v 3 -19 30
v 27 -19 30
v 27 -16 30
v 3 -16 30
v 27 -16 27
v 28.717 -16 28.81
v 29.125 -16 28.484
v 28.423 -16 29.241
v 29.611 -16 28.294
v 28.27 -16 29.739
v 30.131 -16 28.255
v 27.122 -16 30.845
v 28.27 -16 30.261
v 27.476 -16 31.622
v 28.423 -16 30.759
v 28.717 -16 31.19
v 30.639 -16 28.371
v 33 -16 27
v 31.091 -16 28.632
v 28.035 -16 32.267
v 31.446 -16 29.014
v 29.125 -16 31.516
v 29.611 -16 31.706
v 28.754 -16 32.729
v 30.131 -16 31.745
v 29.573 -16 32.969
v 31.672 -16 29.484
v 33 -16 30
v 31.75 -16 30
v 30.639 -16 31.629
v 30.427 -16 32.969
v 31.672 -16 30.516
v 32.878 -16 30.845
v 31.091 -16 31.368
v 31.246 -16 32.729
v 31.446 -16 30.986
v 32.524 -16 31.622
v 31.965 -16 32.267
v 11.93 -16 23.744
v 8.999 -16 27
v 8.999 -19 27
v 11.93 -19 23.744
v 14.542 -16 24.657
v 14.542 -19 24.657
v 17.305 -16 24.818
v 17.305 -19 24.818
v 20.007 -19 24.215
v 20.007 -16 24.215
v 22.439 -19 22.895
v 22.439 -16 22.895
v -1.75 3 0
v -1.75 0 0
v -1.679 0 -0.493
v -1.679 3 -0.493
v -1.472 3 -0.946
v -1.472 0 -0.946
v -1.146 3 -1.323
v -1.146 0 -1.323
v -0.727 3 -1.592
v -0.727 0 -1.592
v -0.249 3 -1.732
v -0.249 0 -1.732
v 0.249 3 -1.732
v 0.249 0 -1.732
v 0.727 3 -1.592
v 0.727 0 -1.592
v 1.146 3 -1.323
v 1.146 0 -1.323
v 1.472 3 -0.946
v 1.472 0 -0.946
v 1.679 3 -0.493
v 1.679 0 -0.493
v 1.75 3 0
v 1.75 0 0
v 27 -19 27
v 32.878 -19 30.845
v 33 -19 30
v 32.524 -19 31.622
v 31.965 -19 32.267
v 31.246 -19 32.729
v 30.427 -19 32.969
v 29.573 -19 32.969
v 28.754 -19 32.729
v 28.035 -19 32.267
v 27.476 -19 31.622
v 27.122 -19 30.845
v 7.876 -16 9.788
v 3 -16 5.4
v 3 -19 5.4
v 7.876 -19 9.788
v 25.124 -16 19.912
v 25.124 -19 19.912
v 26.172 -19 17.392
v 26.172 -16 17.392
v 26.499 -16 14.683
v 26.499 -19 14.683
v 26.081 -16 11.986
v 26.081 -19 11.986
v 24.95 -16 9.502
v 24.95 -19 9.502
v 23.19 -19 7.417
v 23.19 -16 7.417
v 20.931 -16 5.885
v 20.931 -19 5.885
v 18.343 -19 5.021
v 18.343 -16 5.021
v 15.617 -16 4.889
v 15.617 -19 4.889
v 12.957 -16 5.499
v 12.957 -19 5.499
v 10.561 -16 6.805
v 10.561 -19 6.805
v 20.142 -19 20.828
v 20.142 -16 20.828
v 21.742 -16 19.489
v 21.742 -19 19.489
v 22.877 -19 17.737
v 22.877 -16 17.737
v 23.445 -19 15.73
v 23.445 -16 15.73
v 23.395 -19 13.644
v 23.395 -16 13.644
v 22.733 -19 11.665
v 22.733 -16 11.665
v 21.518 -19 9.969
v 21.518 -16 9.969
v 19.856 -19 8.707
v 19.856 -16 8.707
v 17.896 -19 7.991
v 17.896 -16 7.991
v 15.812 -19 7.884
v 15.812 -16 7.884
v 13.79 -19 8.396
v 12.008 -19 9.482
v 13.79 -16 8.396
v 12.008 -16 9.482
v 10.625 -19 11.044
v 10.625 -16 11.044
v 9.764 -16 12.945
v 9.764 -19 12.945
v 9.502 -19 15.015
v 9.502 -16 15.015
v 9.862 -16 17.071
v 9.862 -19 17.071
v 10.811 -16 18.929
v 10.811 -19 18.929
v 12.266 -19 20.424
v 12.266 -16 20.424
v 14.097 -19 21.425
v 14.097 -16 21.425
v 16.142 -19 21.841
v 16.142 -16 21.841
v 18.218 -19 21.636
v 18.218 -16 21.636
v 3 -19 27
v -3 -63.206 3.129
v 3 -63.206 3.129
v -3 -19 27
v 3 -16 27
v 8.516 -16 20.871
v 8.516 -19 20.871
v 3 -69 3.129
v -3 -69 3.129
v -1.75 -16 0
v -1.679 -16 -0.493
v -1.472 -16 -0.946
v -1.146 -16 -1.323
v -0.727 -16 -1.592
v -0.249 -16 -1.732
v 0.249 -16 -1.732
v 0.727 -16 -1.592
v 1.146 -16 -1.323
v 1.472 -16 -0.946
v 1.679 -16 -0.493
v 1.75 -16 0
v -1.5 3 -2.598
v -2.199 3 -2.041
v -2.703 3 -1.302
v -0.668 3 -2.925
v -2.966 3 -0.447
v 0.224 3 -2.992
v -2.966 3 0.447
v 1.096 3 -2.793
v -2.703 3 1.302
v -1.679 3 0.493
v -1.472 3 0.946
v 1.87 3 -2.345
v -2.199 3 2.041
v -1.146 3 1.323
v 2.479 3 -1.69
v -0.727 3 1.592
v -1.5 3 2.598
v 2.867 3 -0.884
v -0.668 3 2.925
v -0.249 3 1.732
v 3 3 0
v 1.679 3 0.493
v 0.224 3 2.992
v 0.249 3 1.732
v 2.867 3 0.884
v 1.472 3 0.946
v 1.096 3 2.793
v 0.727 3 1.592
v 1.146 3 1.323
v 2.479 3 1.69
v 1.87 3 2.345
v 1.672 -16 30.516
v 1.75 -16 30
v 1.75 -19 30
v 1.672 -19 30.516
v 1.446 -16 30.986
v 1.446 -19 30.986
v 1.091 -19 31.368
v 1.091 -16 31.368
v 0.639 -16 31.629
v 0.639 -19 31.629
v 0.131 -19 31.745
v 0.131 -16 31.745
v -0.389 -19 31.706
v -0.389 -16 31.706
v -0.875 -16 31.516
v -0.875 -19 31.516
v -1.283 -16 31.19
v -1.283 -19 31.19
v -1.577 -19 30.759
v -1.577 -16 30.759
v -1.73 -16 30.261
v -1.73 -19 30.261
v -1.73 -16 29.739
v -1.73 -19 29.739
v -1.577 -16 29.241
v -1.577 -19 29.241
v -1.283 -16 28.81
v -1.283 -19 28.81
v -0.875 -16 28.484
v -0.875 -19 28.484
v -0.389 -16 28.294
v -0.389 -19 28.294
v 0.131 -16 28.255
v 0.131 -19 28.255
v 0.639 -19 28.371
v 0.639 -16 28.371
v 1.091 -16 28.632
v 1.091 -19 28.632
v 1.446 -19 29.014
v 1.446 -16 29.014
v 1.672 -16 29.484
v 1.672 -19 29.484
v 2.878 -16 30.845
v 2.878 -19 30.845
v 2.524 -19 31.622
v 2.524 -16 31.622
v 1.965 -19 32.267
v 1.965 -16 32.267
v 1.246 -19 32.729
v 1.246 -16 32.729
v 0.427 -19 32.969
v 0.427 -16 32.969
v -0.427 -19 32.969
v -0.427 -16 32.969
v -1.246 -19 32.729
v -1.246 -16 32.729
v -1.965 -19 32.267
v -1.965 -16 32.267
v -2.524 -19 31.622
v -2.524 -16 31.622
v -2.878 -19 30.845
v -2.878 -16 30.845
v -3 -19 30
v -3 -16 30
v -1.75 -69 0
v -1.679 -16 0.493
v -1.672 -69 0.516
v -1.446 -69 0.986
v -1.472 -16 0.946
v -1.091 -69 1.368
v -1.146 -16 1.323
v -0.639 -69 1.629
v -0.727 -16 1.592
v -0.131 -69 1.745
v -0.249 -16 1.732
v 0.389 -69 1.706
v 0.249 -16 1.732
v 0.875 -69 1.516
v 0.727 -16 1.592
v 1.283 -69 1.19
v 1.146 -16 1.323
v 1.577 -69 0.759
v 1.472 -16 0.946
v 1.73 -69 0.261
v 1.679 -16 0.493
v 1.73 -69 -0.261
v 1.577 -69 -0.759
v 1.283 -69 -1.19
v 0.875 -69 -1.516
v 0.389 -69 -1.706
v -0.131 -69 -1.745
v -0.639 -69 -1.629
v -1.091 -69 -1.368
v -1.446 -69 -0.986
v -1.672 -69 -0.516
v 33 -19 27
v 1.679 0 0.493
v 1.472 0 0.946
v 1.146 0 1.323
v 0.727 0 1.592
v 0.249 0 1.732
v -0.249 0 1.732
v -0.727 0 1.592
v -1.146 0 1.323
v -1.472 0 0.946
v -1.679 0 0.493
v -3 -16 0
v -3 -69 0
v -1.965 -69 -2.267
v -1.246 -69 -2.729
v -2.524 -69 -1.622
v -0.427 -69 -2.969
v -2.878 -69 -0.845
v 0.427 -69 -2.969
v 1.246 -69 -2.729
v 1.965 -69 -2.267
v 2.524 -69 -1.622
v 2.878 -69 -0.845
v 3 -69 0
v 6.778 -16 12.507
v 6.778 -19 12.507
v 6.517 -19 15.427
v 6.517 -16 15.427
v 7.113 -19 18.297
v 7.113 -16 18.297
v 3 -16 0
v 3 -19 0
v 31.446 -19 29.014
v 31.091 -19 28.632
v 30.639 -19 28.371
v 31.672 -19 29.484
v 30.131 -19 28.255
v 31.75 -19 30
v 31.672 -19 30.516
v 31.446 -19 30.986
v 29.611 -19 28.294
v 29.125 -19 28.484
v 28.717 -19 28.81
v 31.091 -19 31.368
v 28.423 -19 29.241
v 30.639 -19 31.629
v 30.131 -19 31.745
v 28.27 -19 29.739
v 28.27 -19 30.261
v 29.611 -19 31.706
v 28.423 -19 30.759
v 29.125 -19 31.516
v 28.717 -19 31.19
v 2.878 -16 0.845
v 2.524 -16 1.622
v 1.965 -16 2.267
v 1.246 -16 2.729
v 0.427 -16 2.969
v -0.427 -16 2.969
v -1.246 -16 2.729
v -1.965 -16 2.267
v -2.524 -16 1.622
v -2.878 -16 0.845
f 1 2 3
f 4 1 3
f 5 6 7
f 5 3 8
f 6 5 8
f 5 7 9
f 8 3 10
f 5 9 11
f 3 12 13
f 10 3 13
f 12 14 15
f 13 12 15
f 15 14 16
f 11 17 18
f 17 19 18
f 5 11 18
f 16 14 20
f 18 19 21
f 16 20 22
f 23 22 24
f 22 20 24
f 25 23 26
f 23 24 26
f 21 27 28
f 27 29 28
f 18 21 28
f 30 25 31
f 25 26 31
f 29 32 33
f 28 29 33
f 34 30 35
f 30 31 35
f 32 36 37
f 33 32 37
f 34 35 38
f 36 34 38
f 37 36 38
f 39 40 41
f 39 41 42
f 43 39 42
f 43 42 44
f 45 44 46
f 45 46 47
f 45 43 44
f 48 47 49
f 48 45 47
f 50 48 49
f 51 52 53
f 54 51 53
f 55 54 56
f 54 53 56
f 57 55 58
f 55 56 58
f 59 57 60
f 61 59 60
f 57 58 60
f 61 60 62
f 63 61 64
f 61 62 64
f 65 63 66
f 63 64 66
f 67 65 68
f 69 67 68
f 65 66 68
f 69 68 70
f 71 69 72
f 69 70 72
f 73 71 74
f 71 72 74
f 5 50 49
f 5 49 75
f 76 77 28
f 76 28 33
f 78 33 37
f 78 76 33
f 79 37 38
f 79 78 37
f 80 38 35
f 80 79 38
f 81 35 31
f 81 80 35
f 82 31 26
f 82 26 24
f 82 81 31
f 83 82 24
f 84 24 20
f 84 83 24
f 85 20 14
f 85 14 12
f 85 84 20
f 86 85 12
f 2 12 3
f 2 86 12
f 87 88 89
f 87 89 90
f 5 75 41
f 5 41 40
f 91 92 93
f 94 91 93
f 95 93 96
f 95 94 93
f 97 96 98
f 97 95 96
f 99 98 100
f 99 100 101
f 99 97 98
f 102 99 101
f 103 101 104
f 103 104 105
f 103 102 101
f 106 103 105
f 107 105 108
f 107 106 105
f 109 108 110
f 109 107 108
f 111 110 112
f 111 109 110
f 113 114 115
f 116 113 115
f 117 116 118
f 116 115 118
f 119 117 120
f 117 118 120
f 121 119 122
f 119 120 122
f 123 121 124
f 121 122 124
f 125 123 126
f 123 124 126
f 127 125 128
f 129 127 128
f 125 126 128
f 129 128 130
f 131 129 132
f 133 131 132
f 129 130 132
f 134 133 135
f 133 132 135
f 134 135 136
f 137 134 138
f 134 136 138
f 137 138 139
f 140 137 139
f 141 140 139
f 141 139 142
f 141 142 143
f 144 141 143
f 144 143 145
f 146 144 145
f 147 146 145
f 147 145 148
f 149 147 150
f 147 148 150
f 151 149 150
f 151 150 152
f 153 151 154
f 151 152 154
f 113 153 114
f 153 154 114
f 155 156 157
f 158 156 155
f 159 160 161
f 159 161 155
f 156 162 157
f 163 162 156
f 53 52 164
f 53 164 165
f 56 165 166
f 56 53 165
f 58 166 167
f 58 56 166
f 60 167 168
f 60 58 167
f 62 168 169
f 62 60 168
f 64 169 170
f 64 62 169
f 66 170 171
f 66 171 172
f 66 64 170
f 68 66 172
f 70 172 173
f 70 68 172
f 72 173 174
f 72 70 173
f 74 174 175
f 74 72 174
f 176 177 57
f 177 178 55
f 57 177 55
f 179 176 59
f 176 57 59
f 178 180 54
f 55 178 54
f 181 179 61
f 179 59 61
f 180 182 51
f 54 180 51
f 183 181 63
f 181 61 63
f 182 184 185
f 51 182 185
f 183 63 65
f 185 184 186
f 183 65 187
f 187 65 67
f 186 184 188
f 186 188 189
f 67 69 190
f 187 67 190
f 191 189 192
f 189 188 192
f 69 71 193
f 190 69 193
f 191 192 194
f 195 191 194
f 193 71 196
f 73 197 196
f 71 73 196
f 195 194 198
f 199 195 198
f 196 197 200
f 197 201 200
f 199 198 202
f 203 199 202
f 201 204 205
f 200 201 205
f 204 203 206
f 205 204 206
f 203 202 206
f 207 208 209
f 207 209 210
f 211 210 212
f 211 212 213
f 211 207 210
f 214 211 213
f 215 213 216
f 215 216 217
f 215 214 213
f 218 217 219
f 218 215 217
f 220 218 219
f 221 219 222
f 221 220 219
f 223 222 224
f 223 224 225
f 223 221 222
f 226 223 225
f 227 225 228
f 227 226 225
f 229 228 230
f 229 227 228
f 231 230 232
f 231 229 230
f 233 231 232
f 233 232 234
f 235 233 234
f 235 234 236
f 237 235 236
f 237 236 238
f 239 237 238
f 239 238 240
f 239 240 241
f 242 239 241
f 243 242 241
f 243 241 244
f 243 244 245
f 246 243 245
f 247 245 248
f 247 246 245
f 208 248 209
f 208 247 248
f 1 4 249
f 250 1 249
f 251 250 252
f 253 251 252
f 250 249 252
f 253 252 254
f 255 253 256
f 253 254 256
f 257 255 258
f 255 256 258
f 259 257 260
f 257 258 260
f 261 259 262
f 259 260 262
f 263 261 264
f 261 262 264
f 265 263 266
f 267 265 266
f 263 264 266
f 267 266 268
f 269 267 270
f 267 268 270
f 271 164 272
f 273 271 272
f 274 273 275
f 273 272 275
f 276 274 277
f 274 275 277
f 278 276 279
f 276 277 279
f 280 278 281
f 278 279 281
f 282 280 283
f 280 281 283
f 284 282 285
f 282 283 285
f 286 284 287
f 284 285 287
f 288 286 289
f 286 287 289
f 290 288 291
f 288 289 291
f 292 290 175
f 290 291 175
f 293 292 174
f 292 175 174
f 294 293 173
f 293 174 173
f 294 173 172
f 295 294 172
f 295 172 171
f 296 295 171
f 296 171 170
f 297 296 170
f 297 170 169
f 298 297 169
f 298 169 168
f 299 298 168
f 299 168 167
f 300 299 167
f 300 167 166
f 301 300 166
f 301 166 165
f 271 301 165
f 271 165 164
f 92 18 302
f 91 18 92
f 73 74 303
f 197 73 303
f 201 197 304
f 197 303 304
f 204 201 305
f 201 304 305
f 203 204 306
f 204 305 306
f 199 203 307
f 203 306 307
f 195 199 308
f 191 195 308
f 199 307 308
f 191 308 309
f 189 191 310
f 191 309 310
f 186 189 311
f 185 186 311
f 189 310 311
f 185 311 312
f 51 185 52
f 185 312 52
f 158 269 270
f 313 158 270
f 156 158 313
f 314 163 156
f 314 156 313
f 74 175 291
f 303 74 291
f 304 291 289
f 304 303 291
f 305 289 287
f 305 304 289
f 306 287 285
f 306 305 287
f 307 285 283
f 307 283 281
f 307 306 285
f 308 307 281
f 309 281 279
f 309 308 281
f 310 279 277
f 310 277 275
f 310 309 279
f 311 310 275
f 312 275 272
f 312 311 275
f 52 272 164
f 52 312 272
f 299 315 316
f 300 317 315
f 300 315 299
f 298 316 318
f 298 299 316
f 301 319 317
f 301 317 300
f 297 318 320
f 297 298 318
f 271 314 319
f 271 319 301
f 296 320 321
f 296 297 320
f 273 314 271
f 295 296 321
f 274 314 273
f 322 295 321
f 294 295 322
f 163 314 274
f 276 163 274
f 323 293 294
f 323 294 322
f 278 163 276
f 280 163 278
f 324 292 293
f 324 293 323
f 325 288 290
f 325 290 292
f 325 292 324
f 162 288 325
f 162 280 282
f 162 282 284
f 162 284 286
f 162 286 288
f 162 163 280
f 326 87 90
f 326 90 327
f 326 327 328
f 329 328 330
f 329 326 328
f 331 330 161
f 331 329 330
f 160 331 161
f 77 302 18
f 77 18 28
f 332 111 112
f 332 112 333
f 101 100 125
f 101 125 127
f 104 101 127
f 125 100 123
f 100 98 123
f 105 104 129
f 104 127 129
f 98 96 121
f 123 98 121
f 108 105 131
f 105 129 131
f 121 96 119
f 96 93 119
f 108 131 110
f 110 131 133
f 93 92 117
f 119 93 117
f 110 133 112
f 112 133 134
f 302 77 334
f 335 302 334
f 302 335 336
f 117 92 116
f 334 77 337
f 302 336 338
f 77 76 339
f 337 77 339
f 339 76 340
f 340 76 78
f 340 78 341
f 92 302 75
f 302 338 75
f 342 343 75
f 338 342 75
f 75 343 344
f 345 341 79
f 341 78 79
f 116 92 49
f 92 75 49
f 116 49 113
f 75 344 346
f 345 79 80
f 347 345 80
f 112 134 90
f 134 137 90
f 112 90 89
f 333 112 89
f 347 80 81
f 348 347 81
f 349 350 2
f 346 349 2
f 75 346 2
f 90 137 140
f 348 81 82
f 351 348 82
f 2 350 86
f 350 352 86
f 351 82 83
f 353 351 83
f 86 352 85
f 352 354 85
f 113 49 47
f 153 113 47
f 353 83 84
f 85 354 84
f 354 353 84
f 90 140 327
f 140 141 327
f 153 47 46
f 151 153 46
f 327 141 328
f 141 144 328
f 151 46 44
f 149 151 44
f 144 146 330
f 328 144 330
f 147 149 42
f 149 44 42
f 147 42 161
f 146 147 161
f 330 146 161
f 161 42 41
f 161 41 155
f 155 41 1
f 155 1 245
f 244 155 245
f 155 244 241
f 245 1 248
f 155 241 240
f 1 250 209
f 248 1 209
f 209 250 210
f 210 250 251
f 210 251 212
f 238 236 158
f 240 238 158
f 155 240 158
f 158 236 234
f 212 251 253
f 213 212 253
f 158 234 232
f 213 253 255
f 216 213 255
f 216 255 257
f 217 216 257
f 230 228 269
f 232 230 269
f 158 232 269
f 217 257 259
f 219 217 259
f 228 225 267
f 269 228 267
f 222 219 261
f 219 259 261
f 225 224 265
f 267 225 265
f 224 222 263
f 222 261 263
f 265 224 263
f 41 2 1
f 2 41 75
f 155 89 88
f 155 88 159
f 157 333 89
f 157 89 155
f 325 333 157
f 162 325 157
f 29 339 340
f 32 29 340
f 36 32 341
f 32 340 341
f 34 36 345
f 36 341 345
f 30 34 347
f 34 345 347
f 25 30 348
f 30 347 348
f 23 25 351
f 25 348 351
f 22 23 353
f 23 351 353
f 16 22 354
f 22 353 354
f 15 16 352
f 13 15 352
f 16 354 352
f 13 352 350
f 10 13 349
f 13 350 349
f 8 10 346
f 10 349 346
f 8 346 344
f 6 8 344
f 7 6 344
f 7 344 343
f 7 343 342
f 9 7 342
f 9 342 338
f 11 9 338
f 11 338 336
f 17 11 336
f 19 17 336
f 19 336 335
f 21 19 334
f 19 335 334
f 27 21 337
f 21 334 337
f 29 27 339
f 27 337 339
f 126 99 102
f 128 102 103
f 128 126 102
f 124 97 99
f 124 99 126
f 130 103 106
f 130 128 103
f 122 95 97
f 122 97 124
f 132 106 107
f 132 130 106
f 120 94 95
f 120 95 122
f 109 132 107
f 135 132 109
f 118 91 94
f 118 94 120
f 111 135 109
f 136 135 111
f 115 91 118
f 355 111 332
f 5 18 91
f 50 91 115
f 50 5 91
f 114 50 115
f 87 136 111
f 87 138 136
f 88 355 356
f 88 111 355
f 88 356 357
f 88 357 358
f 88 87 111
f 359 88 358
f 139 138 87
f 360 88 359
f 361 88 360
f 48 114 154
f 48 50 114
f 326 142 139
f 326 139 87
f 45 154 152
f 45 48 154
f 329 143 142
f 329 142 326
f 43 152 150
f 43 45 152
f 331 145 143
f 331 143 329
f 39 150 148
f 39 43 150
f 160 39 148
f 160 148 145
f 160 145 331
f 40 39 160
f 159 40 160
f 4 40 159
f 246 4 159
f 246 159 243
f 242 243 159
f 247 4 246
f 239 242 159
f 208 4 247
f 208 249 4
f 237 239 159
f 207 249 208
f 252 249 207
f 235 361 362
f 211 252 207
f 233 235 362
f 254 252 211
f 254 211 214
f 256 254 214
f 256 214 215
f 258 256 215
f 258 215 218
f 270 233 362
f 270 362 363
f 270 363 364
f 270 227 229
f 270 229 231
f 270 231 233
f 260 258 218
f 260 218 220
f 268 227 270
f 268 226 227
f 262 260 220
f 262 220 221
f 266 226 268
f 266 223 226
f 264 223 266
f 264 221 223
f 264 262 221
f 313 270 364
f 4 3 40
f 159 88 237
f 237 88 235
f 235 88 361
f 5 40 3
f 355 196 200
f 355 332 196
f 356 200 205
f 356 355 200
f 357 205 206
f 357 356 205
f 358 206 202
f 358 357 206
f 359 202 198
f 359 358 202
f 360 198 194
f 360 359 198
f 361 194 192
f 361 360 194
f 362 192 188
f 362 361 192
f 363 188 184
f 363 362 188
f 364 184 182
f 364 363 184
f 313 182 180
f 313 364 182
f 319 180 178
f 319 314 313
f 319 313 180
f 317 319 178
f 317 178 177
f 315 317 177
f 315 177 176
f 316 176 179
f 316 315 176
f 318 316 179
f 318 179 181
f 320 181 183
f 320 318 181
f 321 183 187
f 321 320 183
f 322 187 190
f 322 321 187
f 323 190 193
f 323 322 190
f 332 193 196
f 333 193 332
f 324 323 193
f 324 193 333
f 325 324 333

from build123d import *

# Parameters (mm, degrees)
F0_R          = 3
F0_R_2        = 1.75
F1_DEPTH      = 16
F1_DEPTH_BACK = 2.99974
F2_R          = 1.75
F3_DEPTH      = 3
F5_DEPTH      = 6
F7_DEPTH      = 50
F10_DEPTH     = 6
F8_R          = 1.75
F11_DEPTH     = 72.00074
F12_R         = 1.75
F13_DEPTH     = 2.99974
F14_W         = 3
F14_H         = 3
F15_DEPTH     = 24
F17_DEPTH     = 3
F18_R         = 10
F18_R_2       = 7
F19_DEPTH     = 3
F21_DEPTH     = 3
F22_R         = 7
F23_DEPTH     = 25.4


with BuildPart() as f1:
    # F0 (on Front) → F1 (new body, two sides)
    with BuildSketch(Plane.XZ) as f1_sk:
        Circle(F0_R)
        Circle(F0_R_2, mode=Mode.SUBTRACT)
    extrude(amount=F1_DEPTH)
    extrude(f1_sk.sketch, amount=-F1_DEPTH_BACK)

    # F2 (on face) → F3 (join)
    with BuildSketch(Plane.XZ.offset(16)):
        with BuildLine():
            Line((-3, 30), (-3, 0))
            ThreePointArc((-3, 0), (0, -3), (3, 0))
            Line((3, 0), (3, 30))
            ThreePointArc((3, 30), (0, 33), (-3, 30))
        make_face()
        with Locations((0, 30)):
            Circle(F2_R, mode=Mode.SUBTRACT)
    extrude(amount=F3_DEPTH)

    # F4 (on face) → F5 (join, through all)
    with BuildSketch(Plane(origin=(-3, 0, 0), x_dir=(0, -1, 0), z_dir=(-1, 0, 0))):
        Polygon((69, 0), (19, 27), (19, 0), align=None)
    extrude(amount=-F5_DEPTH)

    # F6 (on face) → F7 (join, through all)
    with BuildSketch(Plane.XZ.offset(19)):
        with BuildLine():
            Line((3, 0), (-3, 0))
            ThreePointArc((-3, 0), (0, -3), (3, 0))
        make_face()
    extrude(amount=F7_DEPTH)

    # F9 (on face) → F10 (join)
    with BuildSketch(Plane.XZ.offset(69)):
        with BuildLine():
            Line((-3, 3.128744429), (-3, 0))
            ThreePointArc((-3, 0), (0, -3), (3, 0))
            Line((3, 0), (3, 3.128744429))
            Line((3, 3.128744429), (-3, 3.128744429))
        make_face()
    extrude(amount=-F10_DEPTH)

    # F8 (on face) → F11 (cut, through all)
    with BuildSketch(Plane(origin=(0, 2.99974, 0), x_dir=(-1, 0, 0), z_dir=(0, 1, 0))):
        Circle(F8_R)
    extrude(amount=-F11_DEPTH, mode=Mode.SUBTRACT)



with BuildPart() as f13:
    # F12 (on face) → F13 (new body)
    with BuildSketch(Plane.XZ.offset(19)):
        with BuildLine():
            Line((33, 27), (33, 30))
            ThreePointArc((33, 30), (30, 33), (27, 30))
            Line((27, 30), (27, 27))
            Line((27, 27), (33, 27))
        make_face()
        with Locations((30, 30)):
            Circle(F12_R, mode=Mode.SUBTRACT)
    extrude(amount=-F13_DEPTH)


with BuildPart() as f1_1:
    add(f1.part)

    add(f13.part)  # F15 merges F13
    # F14 (on face) → F15 (join, through all)
    with BuildSketch(Plane.YZ.offset(3)):
        with Locations((-17.5, 28.5)):
            Rectangle(F14_W, F14_H)
    extrude(amount=F15_DEPTH)

    # F16 (on face) → F17 (join, through all)
    with BuildSketch(Plane(origin=(0, -16, 0), x_dir=(-1, 0, 0), z_dir=(0, 1, 0))):
        Polygon((-27, 27), (-33, 27), (-3, 0), (-3, 5.4), align=None)
    extrude(amount=-F17_DEPTH)

    # F18 (on face) → F19 (join, through all)
    with BuildSketch(Plane(origin=(0, -16, 0), x_dir=(-1, 0, 0), z_dir=(0, 1, 0))):
        with Locations((-16.5, 14.85)):
            Circle(F18_R)
        with Locations((-16.5, 14.85)):
            Circle(F18_R_2, mode=Mode.SUBTRACT)
    extrude(amount=-F19_DEPTH)

    # F20 (on face) → F21 (join, through all)
    with BuildSketch(Plane(origin=(0, -16, 0), x_dir=(-1, 0, 0), z_dir=(0, 1, 0))):
        with BuildLine():
            Line((-8.5159330462, 20.8711855043), (-3, 27))
            Line((-3, 27), (-8.99948, 27))
            Line((-8.99948, 27), (-11.9295075041, 23.7444138843))
            ThreePointArc((-11.9295075041, 23.7444138843), (-10.0604269493, 22.5006142842), (-8.5159330462, 20.8711855043))
        make_face()
    extrude(amount=-F21_DEPTH)

    # F22 (on face) → F23 (cut)
    with BuildSketch(Plane(origin=(0, -16, 0), x_dir=(-1, 0, 0), z_dir=(0, 1, 0))):
        with Locations((-16.5, 14.85)):
            Circle(F22_R)
    extrude(amount=-F23_DEPTH, mode=Mode.SUBTRACT)


solid = f1_1.part
